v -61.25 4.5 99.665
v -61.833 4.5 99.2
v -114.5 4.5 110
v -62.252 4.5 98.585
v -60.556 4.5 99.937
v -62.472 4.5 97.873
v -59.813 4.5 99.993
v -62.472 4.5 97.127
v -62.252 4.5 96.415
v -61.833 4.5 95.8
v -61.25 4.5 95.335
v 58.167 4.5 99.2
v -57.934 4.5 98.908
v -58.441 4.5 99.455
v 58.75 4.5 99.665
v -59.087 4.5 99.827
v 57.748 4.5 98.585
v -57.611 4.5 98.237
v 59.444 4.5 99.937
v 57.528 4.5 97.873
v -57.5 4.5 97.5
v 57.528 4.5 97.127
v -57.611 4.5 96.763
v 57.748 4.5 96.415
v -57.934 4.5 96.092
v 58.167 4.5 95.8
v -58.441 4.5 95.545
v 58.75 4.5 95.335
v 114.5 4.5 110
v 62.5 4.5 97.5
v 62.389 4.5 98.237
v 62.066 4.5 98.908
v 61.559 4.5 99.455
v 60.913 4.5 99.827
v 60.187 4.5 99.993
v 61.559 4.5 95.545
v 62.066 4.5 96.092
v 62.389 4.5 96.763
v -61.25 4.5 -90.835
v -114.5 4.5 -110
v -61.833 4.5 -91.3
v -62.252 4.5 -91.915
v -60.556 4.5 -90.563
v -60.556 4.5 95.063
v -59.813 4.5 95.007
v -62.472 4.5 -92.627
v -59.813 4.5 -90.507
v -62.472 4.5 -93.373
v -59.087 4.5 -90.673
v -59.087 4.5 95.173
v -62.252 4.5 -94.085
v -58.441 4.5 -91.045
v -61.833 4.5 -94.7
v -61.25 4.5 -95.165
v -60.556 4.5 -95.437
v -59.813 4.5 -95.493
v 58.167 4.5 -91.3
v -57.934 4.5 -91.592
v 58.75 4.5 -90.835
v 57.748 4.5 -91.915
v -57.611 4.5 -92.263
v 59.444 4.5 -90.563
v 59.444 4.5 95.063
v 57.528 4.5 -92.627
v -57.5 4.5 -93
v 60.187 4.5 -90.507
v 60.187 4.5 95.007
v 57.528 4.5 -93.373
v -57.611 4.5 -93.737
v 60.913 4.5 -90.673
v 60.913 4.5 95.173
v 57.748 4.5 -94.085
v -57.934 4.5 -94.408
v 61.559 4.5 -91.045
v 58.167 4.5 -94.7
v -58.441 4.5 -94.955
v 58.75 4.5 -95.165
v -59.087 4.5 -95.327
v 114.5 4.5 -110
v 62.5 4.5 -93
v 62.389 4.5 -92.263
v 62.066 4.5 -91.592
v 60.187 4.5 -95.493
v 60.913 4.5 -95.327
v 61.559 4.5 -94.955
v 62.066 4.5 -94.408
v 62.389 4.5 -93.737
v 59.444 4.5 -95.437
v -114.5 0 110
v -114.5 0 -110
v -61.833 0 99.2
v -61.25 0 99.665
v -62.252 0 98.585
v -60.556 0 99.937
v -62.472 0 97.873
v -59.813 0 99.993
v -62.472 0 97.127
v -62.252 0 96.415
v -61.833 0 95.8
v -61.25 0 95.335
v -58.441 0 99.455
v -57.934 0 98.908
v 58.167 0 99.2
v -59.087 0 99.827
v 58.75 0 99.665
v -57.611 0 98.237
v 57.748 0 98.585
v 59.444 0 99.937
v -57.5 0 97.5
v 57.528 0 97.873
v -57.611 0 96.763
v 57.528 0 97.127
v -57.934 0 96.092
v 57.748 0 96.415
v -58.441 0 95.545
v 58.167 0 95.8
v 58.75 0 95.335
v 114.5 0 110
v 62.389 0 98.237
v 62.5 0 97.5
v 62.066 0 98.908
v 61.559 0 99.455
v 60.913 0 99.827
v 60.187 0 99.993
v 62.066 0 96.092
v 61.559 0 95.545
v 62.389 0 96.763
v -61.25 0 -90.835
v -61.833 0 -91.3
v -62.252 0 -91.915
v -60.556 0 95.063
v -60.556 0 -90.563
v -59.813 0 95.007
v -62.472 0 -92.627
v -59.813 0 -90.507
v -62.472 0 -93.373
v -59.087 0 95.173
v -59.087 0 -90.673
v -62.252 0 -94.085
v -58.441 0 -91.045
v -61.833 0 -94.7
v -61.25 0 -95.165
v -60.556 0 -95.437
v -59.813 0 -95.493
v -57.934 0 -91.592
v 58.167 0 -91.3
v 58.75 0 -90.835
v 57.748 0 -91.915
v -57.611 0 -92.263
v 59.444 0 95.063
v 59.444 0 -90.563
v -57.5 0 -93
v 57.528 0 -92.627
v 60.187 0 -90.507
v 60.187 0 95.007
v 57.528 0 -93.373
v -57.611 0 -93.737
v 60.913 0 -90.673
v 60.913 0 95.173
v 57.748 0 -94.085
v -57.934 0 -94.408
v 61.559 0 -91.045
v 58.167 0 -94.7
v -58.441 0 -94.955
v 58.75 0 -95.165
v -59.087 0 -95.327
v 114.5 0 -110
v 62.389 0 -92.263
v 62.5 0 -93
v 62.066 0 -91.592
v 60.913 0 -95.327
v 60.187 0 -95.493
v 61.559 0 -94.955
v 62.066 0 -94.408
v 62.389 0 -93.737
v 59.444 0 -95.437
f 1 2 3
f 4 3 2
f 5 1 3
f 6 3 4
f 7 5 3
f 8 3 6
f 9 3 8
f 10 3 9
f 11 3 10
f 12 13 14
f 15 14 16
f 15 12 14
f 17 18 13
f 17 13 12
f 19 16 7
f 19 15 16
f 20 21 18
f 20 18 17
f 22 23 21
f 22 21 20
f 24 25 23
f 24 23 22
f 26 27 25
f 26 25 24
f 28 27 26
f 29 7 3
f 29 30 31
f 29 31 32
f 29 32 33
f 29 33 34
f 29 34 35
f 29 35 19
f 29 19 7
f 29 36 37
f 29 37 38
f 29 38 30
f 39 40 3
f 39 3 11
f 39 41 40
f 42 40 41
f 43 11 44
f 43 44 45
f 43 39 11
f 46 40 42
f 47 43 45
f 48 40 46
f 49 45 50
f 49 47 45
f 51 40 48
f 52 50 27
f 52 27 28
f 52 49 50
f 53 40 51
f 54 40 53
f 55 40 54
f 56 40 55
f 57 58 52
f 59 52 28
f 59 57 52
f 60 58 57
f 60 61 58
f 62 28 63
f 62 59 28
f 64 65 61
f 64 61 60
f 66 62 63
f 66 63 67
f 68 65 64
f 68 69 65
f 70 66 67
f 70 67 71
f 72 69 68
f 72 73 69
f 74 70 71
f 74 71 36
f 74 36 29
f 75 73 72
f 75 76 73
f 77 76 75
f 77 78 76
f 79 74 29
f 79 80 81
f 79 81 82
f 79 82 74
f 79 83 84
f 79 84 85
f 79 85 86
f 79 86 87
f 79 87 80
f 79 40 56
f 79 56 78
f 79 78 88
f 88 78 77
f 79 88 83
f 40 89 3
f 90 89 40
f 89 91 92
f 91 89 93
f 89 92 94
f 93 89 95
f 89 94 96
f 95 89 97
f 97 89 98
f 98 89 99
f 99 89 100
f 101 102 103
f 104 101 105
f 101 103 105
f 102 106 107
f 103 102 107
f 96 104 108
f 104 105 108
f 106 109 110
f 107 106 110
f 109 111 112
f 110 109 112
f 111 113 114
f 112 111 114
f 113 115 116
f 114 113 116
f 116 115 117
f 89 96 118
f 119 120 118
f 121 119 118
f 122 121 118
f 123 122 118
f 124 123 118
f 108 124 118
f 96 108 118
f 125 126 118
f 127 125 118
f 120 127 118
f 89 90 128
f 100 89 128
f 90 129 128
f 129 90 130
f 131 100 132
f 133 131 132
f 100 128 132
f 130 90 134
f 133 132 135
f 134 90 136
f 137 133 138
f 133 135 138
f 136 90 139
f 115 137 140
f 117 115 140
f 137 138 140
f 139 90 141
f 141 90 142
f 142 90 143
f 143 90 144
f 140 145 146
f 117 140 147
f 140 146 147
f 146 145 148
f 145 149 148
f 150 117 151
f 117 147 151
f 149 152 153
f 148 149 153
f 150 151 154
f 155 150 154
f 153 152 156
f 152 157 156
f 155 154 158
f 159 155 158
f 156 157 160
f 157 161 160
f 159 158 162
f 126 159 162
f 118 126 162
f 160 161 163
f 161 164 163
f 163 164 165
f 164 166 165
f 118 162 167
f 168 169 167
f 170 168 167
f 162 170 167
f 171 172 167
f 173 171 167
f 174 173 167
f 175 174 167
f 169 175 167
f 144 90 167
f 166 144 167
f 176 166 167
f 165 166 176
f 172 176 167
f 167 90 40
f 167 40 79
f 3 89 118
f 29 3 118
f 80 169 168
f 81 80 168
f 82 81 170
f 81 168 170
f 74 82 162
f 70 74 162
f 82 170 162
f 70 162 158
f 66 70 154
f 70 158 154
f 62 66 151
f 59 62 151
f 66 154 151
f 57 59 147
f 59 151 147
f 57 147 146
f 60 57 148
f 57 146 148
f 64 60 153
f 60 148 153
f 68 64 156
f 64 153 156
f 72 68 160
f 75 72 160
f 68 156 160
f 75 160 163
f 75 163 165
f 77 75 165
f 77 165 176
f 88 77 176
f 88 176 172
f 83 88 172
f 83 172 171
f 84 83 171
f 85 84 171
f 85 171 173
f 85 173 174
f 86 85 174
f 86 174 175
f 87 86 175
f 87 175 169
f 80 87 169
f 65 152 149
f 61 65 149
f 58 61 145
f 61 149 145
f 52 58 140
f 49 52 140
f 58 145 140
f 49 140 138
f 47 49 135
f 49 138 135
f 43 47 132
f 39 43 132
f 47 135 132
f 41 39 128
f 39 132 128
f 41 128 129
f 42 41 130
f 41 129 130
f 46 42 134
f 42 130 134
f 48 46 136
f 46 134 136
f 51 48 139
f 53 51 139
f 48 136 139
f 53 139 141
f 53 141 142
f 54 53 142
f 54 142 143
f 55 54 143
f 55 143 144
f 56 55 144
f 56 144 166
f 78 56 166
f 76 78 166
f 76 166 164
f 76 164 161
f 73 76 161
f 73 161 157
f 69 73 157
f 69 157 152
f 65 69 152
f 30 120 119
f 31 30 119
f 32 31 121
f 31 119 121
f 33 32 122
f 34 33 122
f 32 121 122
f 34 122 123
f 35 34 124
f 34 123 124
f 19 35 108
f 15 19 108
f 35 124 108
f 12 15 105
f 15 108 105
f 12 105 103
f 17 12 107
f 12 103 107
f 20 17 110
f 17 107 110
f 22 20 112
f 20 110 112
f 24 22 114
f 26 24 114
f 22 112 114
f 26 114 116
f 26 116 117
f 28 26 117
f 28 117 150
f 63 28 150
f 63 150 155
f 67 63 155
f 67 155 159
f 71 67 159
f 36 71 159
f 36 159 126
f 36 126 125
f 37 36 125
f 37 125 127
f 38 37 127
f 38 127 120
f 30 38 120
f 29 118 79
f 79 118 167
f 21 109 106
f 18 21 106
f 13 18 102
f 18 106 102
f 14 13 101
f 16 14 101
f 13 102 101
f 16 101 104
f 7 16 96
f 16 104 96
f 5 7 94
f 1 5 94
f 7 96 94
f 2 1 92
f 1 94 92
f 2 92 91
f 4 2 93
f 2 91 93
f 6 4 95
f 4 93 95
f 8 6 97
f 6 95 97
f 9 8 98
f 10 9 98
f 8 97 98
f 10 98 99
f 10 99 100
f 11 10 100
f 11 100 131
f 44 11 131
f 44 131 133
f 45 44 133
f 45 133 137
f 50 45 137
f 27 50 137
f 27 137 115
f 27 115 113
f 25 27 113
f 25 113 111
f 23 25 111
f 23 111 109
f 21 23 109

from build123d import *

# Parameters (mm, degrees)
SKETCH1_W           = 229
SKETCH1_H           = 220
BOSS_EXTRUDE1_DEPTH = 4.5
CUT_EXTRUDE1_REACH  = 6.5
SKETCH2_R           = 2.5


with BuildPart() as part:
    # Sketch1 → Boss-Extrude1 (new body)
    with BuildSketch(Plane(origin=(0, 0, 0), x_dir=(1, 0, 0), z_dir=(0, 1, 0))):
        Rectangle(SKETCH1_W, SKETCH1_H)
    extrude(amount=BOSS_EXTRUDE1_DEPTH)

    # Sketch2 → Cut-Extrude1 (cut, up to next)
    with BuildSketch(Plane.XZ, mode=Mode.PRIVATE) as cut_extrude1_sk1:
        with Locations((-60, 97.5)):
            Circle(SKETCH2_R)
    cut_extrude1_tool1 = extrude(cut_extrude1_sk1.sketch, amount=-CUT_EXTRUDE1_REACH, mode=Mode.PRIVATE) & part.part
    add(cut_extrude1_tool1.solids().sort_by_distance((-60, 0, 97.5))[0], mode=Mode.SUBTRACT)
    # Sketch2 → Cut-Extrude1 (cut, up to next)
    with BuildSketch(Plane.XZ, mode=Mode.PRIVATE) as cut_extrude1_sk2:
        with Locations((60, 97.5)):
            Circle(SKETCH2_R)
    cut_extrude1_tool2 = extrude(cut_extrude1_sk2.sketch, amount=-CUT_EXTRUDE1_REACH, mode=Mode.PRIVATE) & part.part
    add(cut_extrude1_tool2.solids().sort_by_distance((60, 0, 97.5))[0], mode=Mode.SUBTRACT)
    # Sketch2 → Cut-Extrude1 (cut, up to next)
    with BuildSketch(Plane.XZ, mode=Mode.PRIVATE) as cut_extrude1_sk3:
        with Locations((60, -93)):
            Circle(SKETCH2_R)
    cut_extrude1_tool3 = extrude(cut_extrude1_sk3.sketch, amount=-CUT_EXTRUDE1_REACH, mode=Mode.PRIVATE) & part.part
    add(cut_extrude1_tool3.solids().sort_by_distance((60, 0, -93))[0], mode=Mode.SUBTRACT)
    # Sketch2 → Cut-Extrude1 (cut, up to next)
    with BuildSketch(Plane.XZ, mode=Mode.PRIVATE) as cut_extrude1_sk4:
        with Locations((-60, -93)):
            Circle(SKETCH2_R)
    cut_extrude1_tool4 = extrude(cut_extrude1_sk4.sketch, amount=-CUT_EXTRUDE1_REACH, mode=Mode.PRIVATE) & part.part
    add(cut_extrude1_tool4.solids().sort_by_distance((-60, 0, -93))[0], mode=Mode.SUBTRACT)


solid = part.part
